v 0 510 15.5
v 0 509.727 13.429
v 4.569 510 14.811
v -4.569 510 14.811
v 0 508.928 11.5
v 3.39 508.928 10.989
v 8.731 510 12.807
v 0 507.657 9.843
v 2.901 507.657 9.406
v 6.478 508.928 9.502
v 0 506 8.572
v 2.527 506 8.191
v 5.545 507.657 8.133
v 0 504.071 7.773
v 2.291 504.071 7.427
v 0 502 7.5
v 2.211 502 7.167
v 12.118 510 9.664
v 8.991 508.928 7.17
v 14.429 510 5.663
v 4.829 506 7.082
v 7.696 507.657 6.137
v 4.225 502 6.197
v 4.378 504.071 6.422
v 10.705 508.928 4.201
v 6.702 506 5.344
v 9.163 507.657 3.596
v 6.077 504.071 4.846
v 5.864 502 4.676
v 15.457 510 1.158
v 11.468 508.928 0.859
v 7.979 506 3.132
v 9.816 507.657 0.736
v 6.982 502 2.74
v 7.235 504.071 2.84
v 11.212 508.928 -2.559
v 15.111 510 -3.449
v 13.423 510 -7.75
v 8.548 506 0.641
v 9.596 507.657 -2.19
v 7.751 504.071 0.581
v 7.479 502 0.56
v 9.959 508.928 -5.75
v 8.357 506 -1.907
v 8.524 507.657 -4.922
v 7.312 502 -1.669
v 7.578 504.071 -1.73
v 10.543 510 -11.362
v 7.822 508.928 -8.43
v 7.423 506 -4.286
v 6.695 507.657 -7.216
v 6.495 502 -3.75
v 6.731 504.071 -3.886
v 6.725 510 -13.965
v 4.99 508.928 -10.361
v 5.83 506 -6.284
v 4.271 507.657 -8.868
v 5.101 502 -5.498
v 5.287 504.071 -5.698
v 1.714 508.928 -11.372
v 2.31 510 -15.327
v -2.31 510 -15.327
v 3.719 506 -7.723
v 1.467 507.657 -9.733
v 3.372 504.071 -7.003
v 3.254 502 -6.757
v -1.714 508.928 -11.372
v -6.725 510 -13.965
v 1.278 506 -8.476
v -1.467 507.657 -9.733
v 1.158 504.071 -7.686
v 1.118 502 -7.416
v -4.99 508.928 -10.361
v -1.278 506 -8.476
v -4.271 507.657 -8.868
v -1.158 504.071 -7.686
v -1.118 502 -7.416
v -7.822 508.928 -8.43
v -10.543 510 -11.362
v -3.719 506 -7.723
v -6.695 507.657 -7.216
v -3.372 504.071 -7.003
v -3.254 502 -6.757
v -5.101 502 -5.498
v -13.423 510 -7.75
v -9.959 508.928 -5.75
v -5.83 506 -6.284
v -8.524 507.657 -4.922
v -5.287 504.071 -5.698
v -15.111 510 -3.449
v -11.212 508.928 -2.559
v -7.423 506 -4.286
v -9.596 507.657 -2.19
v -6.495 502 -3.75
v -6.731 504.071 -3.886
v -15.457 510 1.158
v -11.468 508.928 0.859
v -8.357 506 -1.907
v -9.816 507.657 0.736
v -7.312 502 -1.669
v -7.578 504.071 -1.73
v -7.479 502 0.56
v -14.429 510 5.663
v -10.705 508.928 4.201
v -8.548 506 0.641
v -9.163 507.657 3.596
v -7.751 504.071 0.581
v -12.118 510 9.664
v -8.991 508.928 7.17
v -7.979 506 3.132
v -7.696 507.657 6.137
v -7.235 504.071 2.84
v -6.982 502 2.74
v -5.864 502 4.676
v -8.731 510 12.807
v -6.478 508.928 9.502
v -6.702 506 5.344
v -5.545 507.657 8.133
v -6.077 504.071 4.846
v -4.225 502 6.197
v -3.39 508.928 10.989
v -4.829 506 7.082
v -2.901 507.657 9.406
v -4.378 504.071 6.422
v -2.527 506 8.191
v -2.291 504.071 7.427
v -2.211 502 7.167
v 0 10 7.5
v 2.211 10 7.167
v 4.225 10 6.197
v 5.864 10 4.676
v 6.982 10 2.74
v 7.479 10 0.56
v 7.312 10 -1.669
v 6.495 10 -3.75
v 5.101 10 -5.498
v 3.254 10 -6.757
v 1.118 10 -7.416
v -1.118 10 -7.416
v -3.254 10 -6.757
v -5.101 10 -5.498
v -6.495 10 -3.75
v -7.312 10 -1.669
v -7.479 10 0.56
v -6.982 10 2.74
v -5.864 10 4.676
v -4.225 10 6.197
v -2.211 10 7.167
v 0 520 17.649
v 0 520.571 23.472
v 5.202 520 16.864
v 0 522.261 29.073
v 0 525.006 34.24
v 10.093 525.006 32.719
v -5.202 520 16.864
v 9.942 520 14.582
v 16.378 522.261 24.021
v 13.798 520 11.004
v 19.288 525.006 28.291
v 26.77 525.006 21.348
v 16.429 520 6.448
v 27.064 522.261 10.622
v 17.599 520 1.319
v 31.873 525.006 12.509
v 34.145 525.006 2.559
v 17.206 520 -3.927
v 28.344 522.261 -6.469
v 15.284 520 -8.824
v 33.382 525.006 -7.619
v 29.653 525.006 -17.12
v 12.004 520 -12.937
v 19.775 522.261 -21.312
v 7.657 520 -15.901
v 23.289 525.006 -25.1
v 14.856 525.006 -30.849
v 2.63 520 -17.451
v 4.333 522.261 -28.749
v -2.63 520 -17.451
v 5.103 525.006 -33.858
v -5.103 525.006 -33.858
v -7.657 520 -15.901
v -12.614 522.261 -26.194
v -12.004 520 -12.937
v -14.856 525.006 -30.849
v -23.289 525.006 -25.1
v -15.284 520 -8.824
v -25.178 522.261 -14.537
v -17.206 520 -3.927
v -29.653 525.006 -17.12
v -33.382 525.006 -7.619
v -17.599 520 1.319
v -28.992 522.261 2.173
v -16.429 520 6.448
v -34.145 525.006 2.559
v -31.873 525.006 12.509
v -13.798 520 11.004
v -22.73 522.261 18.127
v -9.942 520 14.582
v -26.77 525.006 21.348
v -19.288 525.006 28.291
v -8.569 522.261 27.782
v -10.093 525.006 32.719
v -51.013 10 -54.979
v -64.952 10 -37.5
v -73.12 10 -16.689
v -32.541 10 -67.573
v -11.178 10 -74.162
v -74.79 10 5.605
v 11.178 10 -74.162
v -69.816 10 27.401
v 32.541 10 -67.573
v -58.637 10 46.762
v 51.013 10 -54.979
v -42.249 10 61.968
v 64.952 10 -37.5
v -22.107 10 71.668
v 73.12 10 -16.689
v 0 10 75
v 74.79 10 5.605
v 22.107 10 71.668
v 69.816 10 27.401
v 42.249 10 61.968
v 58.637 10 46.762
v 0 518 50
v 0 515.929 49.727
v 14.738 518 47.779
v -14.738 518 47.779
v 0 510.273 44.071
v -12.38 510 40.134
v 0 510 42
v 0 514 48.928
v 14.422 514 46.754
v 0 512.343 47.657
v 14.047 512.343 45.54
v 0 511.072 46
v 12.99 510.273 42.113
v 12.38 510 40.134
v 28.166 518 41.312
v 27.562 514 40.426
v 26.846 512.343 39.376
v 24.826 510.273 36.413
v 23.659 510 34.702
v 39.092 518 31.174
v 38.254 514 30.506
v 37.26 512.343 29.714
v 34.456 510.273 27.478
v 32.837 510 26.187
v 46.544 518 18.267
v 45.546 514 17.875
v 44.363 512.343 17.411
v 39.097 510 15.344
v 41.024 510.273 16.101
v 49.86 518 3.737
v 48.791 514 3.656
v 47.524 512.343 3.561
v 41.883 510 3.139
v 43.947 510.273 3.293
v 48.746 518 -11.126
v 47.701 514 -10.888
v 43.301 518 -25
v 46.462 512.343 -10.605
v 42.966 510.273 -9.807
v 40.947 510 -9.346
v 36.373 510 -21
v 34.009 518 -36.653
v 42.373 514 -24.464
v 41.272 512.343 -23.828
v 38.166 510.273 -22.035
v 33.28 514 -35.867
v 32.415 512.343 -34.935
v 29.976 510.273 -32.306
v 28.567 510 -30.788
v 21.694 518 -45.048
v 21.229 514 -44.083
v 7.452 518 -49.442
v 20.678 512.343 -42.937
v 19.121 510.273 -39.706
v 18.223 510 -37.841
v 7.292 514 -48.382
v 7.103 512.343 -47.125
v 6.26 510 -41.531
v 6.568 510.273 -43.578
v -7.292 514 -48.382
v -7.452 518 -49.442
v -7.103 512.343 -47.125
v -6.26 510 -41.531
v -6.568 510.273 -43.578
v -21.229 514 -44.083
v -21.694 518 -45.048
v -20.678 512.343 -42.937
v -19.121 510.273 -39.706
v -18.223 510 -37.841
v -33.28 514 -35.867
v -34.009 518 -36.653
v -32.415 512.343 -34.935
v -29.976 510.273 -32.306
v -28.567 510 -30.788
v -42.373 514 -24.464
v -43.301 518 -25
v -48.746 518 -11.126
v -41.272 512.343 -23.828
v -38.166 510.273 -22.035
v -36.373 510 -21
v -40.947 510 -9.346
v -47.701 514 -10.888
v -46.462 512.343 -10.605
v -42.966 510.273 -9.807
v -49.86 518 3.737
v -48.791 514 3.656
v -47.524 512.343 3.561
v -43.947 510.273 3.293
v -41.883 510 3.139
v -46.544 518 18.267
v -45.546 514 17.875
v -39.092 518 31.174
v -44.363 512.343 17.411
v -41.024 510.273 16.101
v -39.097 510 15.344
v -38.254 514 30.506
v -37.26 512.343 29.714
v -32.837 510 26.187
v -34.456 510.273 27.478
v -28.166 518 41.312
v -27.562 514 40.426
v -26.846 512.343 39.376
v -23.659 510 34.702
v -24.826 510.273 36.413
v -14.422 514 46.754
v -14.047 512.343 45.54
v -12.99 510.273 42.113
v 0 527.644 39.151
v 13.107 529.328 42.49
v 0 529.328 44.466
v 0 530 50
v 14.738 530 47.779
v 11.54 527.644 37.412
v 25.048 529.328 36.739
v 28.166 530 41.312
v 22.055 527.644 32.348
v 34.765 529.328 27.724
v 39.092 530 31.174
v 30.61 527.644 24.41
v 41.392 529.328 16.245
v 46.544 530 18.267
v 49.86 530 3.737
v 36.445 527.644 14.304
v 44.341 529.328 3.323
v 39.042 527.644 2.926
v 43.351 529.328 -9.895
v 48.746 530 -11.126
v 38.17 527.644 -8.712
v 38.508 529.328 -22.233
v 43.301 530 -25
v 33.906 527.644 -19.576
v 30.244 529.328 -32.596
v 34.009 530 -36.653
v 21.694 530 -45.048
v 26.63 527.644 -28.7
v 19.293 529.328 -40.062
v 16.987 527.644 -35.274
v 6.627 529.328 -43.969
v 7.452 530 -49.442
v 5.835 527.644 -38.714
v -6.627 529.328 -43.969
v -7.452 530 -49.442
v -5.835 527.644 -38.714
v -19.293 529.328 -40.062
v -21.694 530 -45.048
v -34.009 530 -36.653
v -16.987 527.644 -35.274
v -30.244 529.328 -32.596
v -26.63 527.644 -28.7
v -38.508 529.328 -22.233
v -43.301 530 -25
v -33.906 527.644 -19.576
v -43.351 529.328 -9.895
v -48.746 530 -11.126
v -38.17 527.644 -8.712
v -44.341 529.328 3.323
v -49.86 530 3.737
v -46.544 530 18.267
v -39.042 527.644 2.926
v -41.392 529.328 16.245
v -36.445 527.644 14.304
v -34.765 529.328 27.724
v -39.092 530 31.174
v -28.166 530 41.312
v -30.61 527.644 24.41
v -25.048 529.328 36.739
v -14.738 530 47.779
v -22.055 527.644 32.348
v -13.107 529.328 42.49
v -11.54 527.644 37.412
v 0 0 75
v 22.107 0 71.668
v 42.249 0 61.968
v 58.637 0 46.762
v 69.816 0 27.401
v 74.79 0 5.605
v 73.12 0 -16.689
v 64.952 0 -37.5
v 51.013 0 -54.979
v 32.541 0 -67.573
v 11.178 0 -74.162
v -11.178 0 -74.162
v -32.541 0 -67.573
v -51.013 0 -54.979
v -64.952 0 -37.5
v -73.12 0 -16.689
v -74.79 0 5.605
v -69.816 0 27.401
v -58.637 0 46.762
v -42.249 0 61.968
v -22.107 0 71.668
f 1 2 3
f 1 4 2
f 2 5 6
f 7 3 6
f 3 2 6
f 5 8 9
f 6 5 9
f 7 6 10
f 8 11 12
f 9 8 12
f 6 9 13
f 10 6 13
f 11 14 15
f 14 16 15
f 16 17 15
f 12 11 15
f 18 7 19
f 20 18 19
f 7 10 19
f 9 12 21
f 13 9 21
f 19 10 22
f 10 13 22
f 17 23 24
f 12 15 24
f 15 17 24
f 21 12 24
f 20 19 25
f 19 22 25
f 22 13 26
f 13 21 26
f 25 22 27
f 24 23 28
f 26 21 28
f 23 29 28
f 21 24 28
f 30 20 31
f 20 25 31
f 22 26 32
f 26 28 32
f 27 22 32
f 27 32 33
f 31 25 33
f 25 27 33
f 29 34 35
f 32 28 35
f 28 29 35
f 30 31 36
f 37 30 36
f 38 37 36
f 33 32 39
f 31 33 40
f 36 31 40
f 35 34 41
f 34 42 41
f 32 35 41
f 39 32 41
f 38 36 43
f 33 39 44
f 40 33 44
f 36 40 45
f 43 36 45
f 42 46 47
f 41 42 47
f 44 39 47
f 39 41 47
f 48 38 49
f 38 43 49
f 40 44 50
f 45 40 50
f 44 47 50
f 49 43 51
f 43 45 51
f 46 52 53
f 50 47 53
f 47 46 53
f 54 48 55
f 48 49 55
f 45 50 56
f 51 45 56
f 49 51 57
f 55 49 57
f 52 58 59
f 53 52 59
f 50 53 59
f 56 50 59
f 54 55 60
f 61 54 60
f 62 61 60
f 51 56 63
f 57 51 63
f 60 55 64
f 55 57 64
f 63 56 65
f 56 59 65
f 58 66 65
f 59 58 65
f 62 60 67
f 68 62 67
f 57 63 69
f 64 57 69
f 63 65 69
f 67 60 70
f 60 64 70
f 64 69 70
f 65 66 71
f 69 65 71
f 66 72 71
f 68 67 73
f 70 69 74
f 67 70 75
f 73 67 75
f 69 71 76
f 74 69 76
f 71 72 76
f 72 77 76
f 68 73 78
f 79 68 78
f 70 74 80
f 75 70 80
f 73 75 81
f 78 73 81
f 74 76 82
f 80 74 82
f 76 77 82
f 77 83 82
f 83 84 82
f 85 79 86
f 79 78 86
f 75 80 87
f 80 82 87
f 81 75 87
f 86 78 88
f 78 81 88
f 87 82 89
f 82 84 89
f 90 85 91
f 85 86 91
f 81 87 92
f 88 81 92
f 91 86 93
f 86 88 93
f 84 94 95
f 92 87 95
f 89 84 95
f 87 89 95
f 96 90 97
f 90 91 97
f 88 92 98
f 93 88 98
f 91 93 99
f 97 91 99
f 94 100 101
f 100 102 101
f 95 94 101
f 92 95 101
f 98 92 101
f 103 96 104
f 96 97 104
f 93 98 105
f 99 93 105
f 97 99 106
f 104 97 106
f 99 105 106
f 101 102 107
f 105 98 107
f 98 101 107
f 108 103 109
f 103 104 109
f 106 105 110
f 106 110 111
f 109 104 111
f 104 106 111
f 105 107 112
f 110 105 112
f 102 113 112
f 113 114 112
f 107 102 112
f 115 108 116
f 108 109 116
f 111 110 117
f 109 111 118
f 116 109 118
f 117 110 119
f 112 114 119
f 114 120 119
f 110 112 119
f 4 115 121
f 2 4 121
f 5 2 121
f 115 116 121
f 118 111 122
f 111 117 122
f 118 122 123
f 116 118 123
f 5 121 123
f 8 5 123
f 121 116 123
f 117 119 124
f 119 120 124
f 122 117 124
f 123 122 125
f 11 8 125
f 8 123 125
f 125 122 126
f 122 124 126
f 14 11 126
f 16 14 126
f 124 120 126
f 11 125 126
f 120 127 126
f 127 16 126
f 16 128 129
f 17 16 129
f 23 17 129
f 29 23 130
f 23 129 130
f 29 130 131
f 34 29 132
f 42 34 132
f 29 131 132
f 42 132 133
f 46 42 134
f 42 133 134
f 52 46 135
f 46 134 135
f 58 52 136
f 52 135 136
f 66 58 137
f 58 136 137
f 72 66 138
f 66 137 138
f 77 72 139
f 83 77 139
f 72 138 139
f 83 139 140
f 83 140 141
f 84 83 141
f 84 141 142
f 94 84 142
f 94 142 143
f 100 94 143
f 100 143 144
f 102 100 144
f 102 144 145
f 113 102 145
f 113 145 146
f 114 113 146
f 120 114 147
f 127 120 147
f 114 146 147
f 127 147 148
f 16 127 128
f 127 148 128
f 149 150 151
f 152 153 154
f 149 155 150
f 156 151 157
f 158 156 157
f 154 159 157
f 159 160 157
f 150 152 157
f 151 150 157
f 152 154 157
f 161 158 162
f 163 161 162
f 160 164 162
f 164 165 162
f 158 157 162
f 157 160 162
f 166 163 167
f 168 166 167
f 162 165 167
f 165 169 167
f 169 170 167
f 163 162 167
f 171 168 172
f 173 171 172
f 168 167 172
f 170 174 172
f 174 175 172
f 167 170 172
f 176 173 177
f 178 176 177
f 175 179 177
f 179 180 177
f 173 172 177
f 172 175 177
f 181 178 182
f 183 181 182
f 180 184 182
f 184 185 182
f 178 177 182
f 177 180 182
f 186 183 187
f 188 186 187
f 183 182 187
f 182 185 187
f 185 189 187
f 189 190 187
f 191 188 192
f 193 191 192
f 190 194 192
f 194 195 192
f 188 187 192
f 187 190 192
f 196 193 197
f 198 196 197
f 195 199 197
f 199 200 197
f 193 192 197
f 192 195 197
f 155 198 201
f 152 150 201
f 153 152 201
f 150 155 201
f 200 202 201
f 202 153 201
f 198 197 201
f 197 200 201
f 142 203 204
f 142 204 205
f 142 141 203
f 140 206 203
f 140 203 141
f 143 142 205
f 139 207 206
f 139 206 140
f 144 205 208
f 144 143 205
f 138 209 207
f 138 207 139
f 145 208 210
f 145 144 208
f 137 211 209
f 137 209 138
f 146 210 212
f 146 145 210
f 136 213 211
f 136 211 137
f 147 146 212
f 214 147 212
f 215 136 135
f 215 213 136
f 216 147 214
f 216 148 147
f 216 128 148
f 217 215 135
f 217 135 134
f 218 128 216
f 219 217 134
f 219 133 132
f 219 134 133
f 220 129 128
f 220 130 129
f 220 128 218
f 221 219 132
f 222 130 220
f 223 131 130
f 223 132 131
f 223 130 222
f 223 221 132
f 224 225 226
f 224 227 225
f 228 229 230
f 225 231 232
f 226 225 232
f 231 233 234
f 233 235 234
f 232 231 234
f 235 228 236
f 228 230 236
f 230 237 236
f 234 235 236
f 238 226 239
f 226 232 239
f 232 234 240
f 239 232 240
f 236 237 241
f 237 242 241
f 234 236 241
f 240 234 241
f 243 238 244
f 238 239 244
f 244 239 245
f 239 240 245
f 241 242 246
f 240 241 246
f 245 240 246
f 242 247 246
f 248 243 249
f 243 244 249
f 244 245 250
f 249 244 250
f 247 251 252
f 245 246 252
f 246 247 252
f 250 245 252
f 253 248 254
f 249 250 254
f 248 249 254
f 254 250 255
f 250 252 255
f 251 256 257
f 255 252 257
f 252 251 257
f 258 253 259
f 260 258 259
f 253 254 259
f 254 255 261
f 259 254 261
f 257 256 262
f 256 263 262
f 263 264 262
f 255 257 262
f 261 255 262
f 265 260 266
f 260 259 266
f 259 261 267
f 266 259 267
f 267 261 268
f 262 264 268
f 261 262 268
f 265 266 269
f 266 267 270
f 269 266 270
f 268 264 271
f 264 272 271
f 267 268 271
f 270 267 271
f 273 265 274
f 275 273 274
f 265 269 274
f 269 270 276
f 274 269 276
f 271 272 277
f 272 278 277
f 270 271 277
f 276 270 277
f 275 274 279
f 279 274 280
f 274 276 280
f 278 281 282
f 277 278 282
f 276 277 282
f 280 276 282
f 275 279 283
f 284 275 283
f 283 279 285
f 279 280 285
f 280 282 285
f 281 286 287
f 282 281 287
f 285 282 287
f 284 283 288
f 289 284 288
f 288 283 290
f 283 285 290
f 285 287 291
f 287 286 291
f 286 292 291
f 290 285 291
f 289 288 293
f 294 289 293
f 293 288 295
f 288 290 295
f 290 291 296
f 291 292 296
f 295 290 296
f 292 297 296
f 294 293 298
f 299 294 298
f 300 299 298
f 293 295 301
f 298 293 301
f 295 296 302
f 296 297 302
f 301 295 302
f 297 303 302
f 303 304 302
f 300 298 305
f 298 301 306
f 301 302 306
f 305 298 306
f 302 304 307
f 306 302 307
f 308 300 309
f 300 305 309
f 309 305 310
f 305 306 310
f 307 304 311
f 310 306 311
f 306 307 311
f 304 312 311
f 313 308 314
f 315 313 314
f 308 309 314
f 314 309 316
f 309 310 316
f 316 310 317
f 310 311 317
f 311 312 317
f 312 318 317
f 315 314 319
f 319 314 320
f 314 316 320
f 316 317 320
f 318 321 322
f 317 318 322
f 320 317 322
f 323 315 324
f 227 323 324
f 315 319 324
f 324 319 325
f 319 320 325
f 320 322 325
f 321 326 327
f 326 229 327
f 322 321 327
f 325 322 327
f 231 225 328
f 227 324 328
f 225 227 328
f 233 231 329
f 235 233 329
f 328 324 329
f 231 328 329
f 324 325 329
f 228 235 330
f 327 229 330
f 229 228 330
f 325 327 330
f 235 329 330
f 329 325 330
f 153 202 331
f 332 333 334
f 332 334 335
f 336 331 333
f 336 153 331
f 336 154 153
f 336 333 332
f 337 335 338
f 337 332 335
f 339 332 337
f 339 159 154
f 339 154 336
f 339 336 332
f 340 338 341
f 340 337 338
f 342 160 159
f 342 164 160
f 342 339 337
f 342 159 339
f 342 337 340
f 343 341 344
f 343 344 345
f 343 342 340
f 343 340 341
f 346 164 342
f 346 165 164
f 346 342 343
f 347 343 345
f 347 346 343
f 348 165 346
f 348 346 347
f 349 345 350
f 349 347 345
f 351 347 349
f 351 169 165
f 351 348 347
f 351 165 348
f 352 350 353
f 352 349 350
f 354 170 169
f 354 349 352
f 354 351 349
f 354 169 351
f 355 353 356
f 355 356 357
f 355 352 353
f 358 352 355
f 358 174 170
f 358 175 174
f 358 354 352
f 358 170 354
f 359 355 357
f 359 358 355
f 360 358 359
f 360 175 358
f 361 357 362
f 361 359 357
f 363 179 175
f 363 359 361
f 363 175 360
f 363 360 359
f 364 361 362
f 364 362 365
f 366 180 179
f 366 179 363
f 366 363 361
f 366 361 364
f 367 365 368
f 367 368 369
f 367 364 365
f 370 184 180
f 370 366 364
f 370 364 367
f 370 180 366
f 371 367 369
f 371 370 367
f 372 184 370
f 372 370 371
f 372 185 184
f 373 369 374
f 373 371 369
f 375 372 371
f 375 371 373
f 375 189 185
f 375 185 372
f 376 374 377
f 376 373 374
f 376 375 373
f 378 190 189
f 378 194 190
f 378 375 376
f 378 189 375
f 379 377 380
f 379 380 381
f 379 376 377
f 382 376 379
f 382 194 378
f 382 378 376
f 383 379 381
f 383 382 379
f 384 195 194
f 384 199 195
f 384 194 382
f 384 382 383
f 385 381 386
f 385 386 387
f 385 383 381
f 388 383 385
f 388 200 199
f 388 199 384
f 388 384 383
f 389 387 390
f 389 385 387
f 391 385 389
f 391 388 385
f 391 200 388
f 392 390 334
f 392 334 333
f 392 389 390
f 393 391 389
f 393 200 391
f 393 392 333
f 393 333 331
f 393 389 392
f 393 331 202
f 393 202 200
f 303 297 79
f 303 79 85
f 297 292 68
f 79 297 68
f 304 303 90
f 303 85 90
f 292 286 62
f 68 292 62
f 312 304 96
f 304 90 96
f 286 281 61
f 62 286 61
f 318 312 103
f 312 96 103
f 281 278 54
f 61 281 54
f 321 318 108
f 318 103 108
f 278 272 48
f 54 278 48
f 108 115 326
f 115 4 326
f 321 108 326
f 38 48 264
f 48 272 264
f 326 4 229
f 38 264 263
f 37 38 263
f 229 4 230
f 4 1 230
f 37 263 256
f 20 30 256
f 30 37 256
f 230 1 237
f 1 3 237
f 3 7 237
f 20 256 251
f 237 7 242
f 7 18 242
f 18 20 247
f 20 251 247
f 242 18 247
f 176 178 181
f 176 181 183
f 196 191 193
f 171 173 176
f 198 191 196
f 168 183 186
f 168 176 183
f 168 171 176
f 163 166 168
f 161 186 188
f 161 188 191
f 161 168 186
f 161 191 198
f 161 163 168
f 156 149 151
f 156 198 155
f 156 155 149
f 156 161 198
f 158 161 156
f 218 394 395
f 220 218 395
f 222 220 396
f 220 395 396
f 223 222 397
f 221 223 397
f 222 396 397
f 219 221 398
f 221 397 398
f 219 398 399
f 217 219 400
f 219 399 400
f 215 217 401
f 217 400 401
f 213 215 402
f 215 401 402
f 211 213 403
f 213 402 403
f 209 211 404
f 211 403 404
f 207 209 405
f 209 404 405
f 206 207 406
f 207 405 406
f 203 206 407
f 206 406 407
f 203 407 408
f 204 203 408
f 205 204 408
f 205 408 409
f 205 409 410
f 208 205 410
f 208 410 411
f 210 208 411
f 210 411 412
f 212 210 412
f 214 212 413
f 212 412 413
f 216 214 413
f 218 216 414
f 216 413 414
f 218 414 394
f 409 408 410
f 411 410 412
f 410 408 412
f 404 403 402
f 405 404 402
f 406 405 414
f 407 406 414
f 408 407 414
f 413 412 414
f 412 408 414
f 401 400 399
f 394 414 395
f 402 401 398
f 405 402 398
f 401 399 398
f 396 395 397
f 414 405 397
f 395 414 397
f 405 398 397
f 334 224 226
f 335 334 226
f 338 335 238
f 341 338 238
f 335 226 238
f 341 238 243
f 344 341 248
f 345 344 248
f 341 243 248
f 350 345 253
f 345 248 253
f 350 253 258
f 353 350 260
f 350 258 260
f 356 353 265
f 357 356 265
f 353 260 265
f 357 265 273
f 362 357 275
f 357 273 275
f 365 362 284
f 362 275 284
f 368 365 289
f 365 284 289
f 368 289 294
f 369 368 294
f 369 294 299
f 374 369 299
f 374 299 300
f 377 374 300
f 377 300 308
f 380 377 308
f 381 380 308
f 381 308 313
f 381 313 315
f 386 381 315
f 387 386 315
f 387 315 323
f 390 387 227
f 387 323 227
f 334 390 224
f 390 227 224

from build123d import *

# Parameters (mm, degrees)
SKETCH1_R           = 75
BOSS_EXTRUDE1_DEPTH = 10
SKETCH2_R           = 7.5
BOSS_EXTRUDE2_DEPTH = 500
SKETCH3_R           = 50
BOSS_EXTRUDE3_DEPTH = 20
FILLET1_R           = 8
SKETCH4_R           = 40.009187759
CUT_EXTRUDE1_DEPTH  = 10
FILLET3_R           = 30
FILLET4_R           = 30


with BuildPart() as part:
    # Sketch1 → Boss-Extrude1 (new body)
    with BuildSketch(Plane(origin=(0, 0, 0), x_dir=(1, 0, 0), z_dir=(0, 1, 0))):
        with Locations(Location((0, 0, 0), (0, 0, 270))):
            Circle(SKETCH1_R)
    extrude(amount=BOSS_EXTRUDE1_DEPTH)

    # Sketch2 → Boss-Extrude2 (add)
    with BuildSketch(Plane(origin=(0, 10, 0), x_dir=(1, 0, 0), z_dir=(0, 1, 0))):
        with Locations(Location((0, 0, 0), (0, 0, 270))):
            Circle(SKETCH2_R)
    extrude(amount=BOSS_EXTRUDE2_DEPTH)

    # Sketch3 → Boss-Extrude3 (add)
    with BuildSketch(Plane(origin=(0, 510, 0), x_dir=(1, 0, 0), z_dir=(0, 1, 0))):
        with Locations(Location((0, 0, 0), (0, 0, 270))):
            Circle(SKETCH3_R)
    extrude(amount=BOSS_EXTRUDE3_DEPTH)

    # Fillet1
    fillet1_edges = [part.edges().sort_by_distance(p)[0] for p in [
        (0, 510, -7.5),
        (0, 510, -50),
    ]]
    fillet(fillet1_edges, radius=FILLET1_R)

    # Sketch4 → Cut-Extrude1 (cut)
    with BuildSketch(Plane(origin=(0, 530, 0), x_dir=(1, 0, 0), z_dir=(0, 1, 0))):
        with Locations(Location((0, 0, 0), (0, 0, 270))):
            Circle(SKETCH4_R)
    extrude(amount=-CUT_EXTRUDE1_DEPTH, mode=Mode.SUBTRACT)

    # Fillet3
    # the kernel refuses this fillet: 30 mm, written as the material it adds along each edge
    with BuildSketch(Plane(origin=(0, 520, 0), x_dir=(0, 0, 1), z_dir=(-1, 0, 0))) as fillet3_piece_1:
        with BuildLine():
            CenterArc((17.648507984, 30), FILLET3_R, 270, 48.189685104)
            Line((17.648507984, 0), (17.648507984, -0.6))
            Line((17.648507984, -0.6), (40.009187759, -0.6))
            Line((40.009187759, -0.6), (40.609187759, 0))
            ThreePointArc((40.609187759, 0), (40.609187759, 5), (40.456401354, 9.6))
            Line((40.456401354, 9.6), (40.009187759, 10))
        make_face()
    revolve(axis=Axis((0, 520, 0), (0, 1, 0)))

    # Fillet4
    # the kernel refuses this fillet: 30 mm, written as the material it takes off along each edge
    with BuildSketch(Plane(origin=(0, 530, 0), x_dir=(0, 0, 1), z_dir=(-1, 0, 0))) as fillet4_piece_1:
        with BuildLine():
            CenterArc((50.832151794, -29.988456502), FILLET4_R, 91.589496733, 31.987749571)
            Line((50, 0), (49.983356964, 0.59976913))
            ThreePointArc((49.983356964, 0.59976913), (45.004593879, 0.6), (40.009187759, 0.6))
            Line((40.009187759, 0.6), (39.561974163, 0.4))
            ThreePointArc((39.561974163, 0.4), (36.891474301, -2.227646014), (33.908493451, -4.494343686))
            Line((33.908493451, -4.494343686), (34.240329889, -4.994228251))
        make_face()
    revolve(axis=Axis((0, 530, 0), (0, 1, 0)), mode=Mode.SUBTRACT)


solid = part.part
